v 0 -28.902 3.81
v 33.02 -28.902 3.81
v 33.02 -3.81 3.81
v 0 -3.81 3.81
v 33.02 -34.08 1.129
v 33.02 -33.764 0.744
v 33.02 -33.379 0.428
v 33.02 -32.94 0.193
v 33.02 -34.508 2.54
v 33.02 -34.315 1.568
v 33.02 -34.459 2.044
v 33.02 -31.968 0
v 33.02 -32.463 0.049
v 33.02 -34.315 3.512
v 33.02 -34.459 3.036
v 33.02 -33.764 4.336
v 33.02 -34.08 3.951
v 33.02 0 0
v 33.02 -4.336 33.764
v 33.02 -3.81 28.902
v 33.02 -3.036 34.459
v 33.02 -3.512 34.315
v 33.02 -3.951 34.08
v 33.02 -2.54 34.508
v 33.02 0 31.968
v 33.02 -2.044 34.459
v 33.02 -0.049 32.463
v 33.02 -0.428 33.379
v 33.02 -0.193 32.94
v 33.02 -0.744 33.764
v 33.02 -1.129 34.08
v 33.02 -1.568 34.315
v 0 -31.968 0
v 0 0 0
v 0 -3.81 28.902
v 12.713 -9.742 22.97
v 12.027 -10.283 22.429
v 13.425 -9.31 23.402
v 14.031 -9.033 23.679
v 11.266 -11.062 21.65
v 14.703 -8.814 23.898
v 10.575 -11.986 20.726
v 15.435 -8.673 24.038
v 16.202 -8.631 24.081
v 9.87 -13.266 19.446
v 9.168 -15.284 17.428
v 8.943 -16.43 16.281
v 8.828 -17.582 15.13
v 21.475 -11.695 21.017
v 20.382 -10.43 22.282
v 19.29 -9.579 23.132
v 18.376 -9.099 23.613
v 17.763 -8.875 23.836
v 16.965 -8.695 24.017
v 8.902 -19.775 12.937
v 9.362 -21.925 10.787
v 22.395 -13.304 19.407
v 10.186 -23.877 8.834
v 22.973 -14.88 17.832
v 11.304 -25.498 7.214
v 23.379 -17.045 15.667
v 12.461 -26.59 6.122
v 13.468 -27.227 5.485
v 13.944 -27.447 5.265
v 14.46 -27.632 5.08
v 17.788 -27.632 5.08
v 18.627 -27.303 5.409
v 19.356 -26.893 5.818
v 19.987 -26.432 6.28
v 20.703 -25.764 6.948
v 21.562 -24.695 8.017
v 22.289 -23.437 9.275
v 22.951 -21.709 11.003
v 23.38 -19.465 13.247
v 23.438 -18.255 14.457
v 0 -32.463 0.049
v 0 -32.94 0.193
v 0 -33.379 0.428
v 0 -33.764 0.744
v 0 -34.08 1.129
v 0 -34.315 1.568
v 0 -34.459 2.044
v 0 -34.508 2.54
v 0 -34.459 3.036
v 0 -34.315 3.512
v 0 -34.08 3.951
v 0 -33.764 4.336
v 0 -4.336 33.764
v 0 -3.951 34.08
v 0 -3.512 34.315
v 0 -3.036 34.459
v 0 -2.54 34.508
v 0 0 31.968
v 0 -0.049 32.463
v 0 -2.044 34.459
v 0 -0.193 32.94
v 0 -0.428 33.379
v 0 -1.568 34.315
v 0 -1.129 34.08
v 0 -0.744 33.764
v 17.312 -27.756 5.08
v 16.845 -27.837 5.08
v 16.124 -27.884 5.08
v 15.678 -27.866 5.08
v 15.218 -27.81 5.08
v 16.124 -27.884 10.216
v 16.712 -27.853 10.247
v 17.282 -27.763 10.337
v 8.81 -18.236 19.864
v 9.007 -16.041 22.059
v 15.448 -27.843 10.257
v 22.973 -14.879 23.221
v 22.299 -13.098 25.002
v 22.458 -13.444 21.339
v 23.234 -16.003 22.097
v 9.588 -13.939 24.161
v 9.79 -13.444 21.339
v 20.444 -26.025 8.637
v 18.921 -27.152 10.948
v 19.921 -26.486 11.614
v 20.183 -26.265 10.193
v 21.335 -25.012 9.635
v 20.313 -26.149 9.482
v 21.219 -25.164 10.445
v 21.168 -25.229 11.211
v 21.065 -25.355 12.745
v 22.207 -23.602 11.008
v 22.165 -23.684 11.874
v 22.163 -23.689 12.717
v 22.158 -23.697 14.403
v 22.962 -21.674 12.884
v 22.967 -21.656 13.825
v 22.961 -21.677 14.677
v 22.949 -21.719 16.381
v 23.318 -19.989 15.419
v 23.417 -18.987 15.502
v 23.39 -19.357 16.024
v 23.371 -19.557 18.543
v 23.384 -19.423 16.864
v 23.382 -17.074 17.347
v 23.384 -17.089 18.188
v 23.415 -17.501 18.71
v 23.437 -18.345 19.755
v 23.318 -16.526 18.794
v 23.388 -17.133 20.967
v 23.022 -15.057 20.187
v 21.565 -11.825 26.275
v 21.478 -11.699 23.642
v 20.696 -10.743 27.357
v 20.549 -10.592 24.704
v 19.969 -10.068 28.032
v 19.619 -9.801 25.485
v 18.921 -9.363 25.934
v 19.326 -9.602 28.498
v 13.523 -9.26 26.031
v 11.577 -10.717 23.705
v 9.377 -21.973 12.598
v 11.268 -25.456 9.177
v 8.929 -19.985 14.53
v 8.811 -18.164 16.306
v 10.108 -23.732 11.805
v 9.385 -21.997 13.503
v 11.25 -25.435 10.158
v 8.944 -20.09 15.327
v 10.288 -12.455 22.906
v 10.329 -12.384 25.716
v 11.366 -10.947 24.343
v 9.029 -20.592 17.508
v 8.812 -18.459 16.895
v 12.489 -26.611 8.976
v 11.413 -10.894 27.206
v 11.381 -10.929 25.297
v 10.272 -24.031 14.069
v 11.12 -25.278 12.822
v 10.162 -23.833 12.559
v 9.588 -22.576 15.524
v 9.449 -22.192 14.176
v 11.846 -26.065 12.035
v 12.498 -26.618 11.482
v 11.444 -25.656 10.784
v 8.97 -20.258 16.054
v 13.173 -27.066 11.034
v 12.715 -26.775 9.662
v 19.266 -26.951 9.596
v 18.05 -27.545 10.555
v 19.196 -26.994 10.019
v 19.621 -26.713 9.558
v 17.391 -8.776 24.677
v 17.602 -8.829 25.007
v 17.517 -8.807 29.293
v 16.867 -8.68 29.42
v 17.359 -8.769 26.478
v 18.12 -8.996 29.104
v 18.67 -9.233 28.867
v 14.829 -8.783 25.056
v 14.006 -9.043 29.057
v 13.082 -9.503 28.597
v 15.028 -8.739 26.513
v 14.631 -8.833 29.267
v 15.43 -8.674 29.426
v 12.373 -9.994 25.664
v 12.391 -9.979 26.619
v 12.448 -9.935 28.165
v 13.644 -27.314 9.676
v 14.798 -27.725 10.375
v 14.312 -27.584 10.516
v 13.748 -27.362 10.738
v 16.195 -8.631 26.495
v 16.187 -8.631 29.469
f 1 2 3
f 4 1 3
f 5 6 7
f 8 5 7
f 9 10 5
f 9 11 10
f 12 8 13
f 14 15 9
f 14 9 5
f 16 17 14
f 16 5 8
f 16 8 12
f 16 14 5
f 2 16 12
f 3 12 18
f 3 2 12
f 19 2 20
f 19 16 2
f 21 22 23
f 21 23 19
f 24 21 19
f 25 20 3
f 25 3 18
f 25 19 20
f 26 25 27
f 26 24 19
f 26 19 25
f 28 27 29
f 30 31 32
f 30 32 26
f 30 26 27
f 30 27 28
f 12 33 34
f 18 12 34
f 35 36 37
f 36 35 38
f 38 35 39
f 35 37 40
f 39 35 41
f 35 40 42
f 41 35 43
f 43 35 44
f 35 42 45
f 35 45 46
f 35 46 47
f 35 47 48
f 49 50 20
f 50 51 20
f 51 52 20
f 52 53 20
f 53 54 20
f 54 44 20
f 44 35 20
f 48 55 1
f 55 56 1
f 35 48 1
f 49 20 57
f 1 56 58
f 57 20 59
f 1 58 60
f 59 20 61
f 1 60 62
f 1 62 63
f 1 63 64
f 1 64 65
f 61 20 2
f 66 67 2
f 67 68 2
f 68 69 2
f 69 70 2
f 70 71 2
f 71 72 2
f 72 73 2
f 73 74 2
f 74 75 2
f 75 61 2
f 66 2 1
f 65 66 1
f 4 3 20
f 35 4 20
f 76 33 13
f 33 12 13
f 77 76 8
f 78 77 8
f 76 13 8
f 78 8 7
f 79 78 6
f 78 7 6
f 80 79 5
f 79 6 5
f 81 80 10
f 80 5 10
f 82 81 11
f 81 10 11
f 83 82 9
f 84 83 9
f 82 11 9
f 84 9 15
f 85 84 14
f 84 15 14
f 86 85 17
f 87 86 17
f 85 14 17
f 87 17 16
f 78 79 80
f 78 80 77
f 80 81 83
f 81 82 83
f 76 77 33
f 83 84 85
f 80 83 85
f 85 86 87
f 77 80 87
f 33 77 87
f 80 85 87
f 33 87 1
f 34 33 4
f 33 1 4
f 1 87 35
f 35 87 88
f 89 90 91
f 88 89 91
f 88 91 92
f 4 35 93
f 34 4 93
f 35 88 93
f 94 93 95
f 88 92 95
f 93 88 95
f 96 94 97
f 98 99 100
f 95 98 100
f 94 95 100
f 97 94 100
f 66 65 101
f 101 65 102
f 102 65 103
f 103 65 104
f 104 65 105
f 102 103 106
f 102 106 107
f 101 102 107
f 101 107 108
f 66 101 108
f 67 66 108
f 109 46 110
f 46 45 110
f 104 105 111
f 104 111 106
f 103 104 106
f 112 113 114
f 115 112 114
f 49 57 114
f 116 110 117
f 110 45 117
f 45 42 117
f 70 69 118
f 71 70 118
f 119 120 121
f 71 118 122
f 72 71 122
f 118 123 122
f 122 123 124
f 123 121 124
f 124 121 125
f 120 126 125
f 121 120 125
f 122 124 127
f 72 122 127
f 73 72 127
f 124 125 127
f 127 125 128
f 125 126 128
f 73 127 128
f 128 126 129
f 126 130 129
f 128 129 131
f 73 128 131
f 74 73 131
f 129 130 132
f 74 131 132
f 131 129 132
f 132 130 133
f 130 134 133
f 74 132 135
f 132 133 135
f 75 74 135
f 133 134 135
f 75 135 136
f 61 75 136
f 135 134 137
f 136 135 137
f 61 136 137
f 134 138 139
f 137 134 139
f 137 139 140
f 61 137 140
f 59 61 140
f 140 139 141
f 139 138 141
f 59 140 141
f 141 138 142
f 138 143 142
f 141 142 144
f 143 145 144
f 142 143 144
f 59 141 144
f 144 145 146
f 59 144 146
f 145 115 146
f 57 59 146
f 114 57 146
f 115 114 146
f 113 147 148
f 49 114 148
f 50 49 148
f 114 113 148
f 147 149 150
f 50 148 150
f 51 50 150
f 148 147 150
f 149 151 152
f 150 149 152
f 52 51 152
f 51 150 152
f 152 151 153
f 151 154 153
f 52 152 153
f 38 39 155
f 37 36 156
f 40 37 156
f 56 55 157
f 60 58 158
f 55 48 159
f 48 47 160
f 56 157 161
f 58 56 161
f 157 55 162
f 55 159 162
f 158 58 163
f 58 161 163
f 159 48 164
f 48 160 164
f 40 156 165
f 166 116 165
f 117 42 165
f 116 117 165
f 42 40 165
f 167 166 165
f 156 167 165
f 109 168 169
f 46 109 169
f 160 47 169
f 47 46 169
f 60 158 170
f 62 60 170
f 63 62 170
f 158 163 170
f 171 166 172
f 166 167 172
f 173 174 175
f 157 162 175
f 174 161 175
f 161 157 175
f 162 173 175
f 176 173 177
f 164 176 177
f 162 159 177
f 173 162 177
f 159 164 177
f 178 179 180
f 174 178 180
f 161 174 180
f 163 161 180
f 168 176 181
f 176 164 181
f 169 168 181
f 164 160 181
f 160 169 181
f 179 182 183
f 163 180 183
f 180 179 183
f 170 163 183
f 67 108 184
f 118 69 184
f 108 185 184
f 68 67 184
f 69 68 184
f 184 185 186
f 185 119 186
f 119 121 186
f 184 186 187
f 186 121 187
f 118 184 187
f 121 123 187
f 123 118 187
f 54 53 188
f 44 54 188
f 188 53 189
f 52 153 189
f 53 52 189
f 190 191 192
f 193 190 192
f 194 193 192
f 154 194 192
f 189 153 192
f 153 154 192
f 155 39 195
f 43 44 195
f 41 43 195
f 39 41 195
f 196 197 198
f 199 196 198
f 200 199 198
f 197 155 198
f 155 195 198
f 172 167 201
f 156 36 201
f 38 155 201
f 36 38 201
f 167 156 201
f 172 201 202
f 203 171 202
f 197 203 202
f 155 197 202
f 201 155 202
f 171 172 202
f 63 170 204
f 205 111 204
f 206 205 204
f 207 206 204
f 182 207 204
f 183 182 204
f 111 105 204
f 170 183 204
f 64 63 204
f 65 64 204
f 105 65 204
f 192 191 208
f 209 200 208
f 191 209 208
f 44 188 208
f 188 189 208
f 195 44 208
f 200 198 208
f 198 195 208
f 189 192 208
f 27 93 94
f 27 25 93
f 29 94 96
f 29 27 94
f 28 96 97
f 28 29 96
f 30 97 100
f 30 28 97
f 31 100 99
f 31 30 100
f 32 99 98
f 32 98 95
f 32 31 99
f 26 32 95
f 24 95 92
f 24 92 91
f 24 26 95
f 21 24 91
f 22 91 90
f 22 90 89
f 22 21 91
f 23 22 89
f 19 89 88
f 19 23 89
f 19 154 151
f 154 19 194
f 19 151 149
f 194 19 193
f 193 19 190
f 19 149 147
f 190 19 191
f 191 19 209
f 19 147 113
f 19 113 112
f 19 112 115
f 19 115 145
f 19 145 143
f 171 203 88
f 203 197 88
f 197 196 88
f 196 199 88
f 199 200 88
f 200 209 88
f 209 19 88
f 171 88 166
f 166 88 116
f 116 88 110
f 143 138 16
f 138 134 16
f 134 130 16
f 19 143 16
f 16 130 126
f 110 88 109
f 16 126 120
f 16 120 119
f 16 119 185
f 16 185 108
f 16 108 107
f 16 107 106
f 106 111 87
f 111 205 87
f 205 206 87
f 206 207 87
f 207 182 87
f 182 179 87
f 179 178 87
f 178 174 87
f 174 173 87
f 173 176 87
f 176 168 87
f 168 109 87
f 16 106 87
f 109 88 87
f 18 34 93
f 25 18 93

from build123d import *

# Parameters (mm, degrees)
F1_DEPTH = 33.02
F2_R     = 2.54
F4_DEPTH = 33.021
F7_DEPTH = 45.72


with BuildPart() as f1:
    # F0 (on Right) → F1 (new body)
    with BuildSketch(Plane.YZ):
        Polygon((-38.1, 0), (0, 0), (0, 38.1), align=None)
    extrude(amount=F1_DEPTH)

    # F2
    f2_edges = [f1.edges().sort_by_distance(p)[0] for p in [
        (16.51, 0, 38.1),
        (16.51, -38.1, 0),
    ]]
    fillet(f2_edges, radius=F2_R)

    # F3 (on face) → F4 (cut, through all)
    with BuildSketch(Plane.YZ.offset(33.02)):
        Polygon((-28.9018463274, 3.81), (-3.81, 3.81), (-3.81, 28.9018463274), align=None)
    extrude(amount=-F4_DEPTH, mode=Mode.SUBTRACT)

    # F6 (on offset) → F7 (cut)
    with BuildSketch(Plane.XY.offset(50.8)):
        with BuildLine():
            add(Edge.make_bspline(
                [(16.1240324378, -27.884254232), (28.7915867598, -27.884254232), (22.4578095988, -13.4440287948), (16.1240324378, 0.9961966425), (9.7902552768, -13.4440287948), (3.4564781158, -27.884254232), (16.1240324378, -27.884254232)],
                knots=[0, 0, 0, 2.0943951024, 2.0943951024, 4.1887902048, 4.1887902048, 6.2831853072, 6.2831853072, 6.2831853072], degree=2, weights=[1, 0.5, 1, 0.5, 1, 0.5, 1]))
        make_face()
    extrude(amount=-F7_DEPTH, mode=Mode.SUBTRACT)


solid = f1.part
